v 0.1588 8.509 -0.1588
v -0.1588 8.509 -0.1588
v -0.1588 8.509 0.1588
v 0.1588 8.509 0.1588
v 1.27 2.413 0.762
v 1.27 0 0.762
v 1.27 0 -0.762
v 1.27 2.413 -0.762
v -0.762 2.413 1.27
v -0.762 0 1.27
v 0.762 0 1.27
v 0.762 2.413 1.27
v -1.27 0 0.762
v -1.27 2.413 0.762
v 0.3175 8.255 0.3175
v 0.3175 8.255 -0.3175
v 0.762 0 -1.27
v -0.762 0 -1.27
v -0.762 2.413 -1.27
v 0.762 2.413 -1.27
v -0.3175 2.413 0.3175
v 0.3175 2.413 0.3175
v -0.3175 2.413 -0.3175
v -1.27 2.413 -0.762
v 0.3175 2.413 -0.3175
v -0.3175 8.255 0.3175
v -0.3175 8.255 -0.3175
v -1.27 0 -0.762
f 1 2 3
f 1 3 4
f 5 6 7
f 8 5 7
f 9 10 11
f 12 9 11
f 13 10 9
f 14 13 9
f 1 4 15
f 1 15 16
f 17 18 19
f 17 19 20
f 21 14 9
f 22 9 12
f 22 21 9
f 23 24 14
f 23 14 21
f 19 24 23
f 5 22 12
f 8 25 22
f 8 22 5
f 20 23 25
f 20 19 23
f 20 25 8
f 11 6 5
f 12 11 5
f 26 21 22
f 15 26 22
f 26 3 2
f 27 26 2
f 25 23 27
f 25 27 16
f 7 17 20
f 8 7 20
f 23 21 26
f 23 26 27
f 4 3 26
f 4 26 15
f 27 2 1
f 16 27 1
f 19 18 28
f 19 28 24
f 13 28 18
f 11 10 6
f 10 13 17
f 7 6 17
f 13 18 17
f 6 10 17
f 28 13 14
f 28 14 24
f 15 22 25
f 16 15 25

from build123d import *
from OCP.BRepFilletAPI import BRepFilletAPI_MakeChamfer

# Parameters (mm, degrees)
SKETCH1_W           = 2.54
SKETCH1_H           = 2.54
BOSS_EXTRUDE1_DEPTH = 2.413
CHAMFER1_SIZE       = 0.508
SKETCH2_W           = 0.635
SKETCH2_H           = 0.635
BOSS_EXTRUDE2_DEPTH = 6.096
CHAMFER2_SIZE       = 0.254
CHAMFER2_SIZE2      = 0.158716815


with BuildPart() as part:
    # Sketch1 → Boss-Extrude1 (new body)
    with BuildSketch(Plane(origin=(0, 0, 0), x_dir=(1, 0, 0), z_dir=(0, 1, 0))):
        Rectangle(SKETCH1_W, SKETCH1_H)
    extrude(amount=BOSS_EXTRUDE1_DEPTH)

    # Chamfer1
    chamfer1_edges = [part.edges().sort_by_distance(p)[0] for p in [
        (1.27, 1.2065, 1.27),
        (-1.27, 1.2065, 1.27),
        (-1.27, 1.2065, -1.27),
        (1.27, 1.2065, -1.27),
    ]]
    chamfer(chamfer1_edges, length=CHAMFER1_SIZE)

    # Sketch2 → Boss-Extrude2 (add)
    with BuildSketch(Plane(origin=(0, 2.413, 0), x_dir=(1, 0, 0), z_dir=(0, 1, 0))):
        Rectangle(SKETCH2_W, SKETCH2_H)
    extrude(amount=BOSS_EXTRUDE2_DEPTH)

    # Chamfer2: one chamfer whose edges measure the first distance from different faces: ONE call of the kernel's chamfer builder (chamfer() names one face for all edges)
    chamfer2_edges_1 = [part.edges().sort_by_distance(p)[0] for p in [
        (0.3175, 8.509, 0),
    ]]
    chamfer2_side_1 = [part.faces().sort_by_distance(p)[0] for p in [
        (0.3175, 5.461, 0),
    ]]
    chamfer2_edges_2 = [part.edges().sort_by_distance(p)[0] for p in [
        (0, 8.509, -0.3175),
    ]]
    chamfer2_side_2 = [part.faces().sort_by_distance(p)[0] for p in [
        (0, 5.461, -0.3175),
    ]]
    chamfer2_edges_3 = [part.edges().sort_by_distance(p)[0] for p in [
        (-0.3175, 8.509, 0),
    ]]
    chamfer2_side_3 = [part.faces().sort_by_distance(p)[0] for p in [
        (-0.3175, 5.461, 0),
    ]]
    chamfer2_edges_4 = [part.edges().sort_by_distance(p)[0] for p in [
        (0, 8.509, 0.3175),
    ]]
    chamfer2_side_4 = [part.faces().sort_by_distance(p)[0] for p in [
        (0, 5.461, 0.3175),
    ]]
    chamfer2 = BRepFilletAPI_MakeChamfer(part.part.solid().wrapped)
    for e in chamfer2_edges_1:
        chamfer2.Add(CHAMFER2_SIZE, CHAMFER2_SIZE2, e.wrapped, chamfer2_side_1[0].wrapped)  # the first distance lies on this face
    for e in chamfer2_edges_2:
        chamfer2.Add(CHAMFER2_SIZE, CHAMFER2_SIZE2, e.wrapped, chamfer2_side_2[0].wrapped)  # the first distance lies on this face
    for e in chamfer2_edges_3:
        chamfer2.Add(CHAMFER2_SIZE, CHAMFER2_SIZE2, e.wrapped, chamfer2_side_3[0].wrapped)  # the first distance lies on this face
    for e in chamfer2_edges_4:
        chamfer2.Add(CHAMFER2_SIZE, CHAMFER2_SIZE2, e.wrapped, chamfer2_side_4[0].wrapped)  # the first distance lies on this face
    add(Compound.cast(chamfer2.Shape()), mode=Mode.REPLACE)


solid = part.part
